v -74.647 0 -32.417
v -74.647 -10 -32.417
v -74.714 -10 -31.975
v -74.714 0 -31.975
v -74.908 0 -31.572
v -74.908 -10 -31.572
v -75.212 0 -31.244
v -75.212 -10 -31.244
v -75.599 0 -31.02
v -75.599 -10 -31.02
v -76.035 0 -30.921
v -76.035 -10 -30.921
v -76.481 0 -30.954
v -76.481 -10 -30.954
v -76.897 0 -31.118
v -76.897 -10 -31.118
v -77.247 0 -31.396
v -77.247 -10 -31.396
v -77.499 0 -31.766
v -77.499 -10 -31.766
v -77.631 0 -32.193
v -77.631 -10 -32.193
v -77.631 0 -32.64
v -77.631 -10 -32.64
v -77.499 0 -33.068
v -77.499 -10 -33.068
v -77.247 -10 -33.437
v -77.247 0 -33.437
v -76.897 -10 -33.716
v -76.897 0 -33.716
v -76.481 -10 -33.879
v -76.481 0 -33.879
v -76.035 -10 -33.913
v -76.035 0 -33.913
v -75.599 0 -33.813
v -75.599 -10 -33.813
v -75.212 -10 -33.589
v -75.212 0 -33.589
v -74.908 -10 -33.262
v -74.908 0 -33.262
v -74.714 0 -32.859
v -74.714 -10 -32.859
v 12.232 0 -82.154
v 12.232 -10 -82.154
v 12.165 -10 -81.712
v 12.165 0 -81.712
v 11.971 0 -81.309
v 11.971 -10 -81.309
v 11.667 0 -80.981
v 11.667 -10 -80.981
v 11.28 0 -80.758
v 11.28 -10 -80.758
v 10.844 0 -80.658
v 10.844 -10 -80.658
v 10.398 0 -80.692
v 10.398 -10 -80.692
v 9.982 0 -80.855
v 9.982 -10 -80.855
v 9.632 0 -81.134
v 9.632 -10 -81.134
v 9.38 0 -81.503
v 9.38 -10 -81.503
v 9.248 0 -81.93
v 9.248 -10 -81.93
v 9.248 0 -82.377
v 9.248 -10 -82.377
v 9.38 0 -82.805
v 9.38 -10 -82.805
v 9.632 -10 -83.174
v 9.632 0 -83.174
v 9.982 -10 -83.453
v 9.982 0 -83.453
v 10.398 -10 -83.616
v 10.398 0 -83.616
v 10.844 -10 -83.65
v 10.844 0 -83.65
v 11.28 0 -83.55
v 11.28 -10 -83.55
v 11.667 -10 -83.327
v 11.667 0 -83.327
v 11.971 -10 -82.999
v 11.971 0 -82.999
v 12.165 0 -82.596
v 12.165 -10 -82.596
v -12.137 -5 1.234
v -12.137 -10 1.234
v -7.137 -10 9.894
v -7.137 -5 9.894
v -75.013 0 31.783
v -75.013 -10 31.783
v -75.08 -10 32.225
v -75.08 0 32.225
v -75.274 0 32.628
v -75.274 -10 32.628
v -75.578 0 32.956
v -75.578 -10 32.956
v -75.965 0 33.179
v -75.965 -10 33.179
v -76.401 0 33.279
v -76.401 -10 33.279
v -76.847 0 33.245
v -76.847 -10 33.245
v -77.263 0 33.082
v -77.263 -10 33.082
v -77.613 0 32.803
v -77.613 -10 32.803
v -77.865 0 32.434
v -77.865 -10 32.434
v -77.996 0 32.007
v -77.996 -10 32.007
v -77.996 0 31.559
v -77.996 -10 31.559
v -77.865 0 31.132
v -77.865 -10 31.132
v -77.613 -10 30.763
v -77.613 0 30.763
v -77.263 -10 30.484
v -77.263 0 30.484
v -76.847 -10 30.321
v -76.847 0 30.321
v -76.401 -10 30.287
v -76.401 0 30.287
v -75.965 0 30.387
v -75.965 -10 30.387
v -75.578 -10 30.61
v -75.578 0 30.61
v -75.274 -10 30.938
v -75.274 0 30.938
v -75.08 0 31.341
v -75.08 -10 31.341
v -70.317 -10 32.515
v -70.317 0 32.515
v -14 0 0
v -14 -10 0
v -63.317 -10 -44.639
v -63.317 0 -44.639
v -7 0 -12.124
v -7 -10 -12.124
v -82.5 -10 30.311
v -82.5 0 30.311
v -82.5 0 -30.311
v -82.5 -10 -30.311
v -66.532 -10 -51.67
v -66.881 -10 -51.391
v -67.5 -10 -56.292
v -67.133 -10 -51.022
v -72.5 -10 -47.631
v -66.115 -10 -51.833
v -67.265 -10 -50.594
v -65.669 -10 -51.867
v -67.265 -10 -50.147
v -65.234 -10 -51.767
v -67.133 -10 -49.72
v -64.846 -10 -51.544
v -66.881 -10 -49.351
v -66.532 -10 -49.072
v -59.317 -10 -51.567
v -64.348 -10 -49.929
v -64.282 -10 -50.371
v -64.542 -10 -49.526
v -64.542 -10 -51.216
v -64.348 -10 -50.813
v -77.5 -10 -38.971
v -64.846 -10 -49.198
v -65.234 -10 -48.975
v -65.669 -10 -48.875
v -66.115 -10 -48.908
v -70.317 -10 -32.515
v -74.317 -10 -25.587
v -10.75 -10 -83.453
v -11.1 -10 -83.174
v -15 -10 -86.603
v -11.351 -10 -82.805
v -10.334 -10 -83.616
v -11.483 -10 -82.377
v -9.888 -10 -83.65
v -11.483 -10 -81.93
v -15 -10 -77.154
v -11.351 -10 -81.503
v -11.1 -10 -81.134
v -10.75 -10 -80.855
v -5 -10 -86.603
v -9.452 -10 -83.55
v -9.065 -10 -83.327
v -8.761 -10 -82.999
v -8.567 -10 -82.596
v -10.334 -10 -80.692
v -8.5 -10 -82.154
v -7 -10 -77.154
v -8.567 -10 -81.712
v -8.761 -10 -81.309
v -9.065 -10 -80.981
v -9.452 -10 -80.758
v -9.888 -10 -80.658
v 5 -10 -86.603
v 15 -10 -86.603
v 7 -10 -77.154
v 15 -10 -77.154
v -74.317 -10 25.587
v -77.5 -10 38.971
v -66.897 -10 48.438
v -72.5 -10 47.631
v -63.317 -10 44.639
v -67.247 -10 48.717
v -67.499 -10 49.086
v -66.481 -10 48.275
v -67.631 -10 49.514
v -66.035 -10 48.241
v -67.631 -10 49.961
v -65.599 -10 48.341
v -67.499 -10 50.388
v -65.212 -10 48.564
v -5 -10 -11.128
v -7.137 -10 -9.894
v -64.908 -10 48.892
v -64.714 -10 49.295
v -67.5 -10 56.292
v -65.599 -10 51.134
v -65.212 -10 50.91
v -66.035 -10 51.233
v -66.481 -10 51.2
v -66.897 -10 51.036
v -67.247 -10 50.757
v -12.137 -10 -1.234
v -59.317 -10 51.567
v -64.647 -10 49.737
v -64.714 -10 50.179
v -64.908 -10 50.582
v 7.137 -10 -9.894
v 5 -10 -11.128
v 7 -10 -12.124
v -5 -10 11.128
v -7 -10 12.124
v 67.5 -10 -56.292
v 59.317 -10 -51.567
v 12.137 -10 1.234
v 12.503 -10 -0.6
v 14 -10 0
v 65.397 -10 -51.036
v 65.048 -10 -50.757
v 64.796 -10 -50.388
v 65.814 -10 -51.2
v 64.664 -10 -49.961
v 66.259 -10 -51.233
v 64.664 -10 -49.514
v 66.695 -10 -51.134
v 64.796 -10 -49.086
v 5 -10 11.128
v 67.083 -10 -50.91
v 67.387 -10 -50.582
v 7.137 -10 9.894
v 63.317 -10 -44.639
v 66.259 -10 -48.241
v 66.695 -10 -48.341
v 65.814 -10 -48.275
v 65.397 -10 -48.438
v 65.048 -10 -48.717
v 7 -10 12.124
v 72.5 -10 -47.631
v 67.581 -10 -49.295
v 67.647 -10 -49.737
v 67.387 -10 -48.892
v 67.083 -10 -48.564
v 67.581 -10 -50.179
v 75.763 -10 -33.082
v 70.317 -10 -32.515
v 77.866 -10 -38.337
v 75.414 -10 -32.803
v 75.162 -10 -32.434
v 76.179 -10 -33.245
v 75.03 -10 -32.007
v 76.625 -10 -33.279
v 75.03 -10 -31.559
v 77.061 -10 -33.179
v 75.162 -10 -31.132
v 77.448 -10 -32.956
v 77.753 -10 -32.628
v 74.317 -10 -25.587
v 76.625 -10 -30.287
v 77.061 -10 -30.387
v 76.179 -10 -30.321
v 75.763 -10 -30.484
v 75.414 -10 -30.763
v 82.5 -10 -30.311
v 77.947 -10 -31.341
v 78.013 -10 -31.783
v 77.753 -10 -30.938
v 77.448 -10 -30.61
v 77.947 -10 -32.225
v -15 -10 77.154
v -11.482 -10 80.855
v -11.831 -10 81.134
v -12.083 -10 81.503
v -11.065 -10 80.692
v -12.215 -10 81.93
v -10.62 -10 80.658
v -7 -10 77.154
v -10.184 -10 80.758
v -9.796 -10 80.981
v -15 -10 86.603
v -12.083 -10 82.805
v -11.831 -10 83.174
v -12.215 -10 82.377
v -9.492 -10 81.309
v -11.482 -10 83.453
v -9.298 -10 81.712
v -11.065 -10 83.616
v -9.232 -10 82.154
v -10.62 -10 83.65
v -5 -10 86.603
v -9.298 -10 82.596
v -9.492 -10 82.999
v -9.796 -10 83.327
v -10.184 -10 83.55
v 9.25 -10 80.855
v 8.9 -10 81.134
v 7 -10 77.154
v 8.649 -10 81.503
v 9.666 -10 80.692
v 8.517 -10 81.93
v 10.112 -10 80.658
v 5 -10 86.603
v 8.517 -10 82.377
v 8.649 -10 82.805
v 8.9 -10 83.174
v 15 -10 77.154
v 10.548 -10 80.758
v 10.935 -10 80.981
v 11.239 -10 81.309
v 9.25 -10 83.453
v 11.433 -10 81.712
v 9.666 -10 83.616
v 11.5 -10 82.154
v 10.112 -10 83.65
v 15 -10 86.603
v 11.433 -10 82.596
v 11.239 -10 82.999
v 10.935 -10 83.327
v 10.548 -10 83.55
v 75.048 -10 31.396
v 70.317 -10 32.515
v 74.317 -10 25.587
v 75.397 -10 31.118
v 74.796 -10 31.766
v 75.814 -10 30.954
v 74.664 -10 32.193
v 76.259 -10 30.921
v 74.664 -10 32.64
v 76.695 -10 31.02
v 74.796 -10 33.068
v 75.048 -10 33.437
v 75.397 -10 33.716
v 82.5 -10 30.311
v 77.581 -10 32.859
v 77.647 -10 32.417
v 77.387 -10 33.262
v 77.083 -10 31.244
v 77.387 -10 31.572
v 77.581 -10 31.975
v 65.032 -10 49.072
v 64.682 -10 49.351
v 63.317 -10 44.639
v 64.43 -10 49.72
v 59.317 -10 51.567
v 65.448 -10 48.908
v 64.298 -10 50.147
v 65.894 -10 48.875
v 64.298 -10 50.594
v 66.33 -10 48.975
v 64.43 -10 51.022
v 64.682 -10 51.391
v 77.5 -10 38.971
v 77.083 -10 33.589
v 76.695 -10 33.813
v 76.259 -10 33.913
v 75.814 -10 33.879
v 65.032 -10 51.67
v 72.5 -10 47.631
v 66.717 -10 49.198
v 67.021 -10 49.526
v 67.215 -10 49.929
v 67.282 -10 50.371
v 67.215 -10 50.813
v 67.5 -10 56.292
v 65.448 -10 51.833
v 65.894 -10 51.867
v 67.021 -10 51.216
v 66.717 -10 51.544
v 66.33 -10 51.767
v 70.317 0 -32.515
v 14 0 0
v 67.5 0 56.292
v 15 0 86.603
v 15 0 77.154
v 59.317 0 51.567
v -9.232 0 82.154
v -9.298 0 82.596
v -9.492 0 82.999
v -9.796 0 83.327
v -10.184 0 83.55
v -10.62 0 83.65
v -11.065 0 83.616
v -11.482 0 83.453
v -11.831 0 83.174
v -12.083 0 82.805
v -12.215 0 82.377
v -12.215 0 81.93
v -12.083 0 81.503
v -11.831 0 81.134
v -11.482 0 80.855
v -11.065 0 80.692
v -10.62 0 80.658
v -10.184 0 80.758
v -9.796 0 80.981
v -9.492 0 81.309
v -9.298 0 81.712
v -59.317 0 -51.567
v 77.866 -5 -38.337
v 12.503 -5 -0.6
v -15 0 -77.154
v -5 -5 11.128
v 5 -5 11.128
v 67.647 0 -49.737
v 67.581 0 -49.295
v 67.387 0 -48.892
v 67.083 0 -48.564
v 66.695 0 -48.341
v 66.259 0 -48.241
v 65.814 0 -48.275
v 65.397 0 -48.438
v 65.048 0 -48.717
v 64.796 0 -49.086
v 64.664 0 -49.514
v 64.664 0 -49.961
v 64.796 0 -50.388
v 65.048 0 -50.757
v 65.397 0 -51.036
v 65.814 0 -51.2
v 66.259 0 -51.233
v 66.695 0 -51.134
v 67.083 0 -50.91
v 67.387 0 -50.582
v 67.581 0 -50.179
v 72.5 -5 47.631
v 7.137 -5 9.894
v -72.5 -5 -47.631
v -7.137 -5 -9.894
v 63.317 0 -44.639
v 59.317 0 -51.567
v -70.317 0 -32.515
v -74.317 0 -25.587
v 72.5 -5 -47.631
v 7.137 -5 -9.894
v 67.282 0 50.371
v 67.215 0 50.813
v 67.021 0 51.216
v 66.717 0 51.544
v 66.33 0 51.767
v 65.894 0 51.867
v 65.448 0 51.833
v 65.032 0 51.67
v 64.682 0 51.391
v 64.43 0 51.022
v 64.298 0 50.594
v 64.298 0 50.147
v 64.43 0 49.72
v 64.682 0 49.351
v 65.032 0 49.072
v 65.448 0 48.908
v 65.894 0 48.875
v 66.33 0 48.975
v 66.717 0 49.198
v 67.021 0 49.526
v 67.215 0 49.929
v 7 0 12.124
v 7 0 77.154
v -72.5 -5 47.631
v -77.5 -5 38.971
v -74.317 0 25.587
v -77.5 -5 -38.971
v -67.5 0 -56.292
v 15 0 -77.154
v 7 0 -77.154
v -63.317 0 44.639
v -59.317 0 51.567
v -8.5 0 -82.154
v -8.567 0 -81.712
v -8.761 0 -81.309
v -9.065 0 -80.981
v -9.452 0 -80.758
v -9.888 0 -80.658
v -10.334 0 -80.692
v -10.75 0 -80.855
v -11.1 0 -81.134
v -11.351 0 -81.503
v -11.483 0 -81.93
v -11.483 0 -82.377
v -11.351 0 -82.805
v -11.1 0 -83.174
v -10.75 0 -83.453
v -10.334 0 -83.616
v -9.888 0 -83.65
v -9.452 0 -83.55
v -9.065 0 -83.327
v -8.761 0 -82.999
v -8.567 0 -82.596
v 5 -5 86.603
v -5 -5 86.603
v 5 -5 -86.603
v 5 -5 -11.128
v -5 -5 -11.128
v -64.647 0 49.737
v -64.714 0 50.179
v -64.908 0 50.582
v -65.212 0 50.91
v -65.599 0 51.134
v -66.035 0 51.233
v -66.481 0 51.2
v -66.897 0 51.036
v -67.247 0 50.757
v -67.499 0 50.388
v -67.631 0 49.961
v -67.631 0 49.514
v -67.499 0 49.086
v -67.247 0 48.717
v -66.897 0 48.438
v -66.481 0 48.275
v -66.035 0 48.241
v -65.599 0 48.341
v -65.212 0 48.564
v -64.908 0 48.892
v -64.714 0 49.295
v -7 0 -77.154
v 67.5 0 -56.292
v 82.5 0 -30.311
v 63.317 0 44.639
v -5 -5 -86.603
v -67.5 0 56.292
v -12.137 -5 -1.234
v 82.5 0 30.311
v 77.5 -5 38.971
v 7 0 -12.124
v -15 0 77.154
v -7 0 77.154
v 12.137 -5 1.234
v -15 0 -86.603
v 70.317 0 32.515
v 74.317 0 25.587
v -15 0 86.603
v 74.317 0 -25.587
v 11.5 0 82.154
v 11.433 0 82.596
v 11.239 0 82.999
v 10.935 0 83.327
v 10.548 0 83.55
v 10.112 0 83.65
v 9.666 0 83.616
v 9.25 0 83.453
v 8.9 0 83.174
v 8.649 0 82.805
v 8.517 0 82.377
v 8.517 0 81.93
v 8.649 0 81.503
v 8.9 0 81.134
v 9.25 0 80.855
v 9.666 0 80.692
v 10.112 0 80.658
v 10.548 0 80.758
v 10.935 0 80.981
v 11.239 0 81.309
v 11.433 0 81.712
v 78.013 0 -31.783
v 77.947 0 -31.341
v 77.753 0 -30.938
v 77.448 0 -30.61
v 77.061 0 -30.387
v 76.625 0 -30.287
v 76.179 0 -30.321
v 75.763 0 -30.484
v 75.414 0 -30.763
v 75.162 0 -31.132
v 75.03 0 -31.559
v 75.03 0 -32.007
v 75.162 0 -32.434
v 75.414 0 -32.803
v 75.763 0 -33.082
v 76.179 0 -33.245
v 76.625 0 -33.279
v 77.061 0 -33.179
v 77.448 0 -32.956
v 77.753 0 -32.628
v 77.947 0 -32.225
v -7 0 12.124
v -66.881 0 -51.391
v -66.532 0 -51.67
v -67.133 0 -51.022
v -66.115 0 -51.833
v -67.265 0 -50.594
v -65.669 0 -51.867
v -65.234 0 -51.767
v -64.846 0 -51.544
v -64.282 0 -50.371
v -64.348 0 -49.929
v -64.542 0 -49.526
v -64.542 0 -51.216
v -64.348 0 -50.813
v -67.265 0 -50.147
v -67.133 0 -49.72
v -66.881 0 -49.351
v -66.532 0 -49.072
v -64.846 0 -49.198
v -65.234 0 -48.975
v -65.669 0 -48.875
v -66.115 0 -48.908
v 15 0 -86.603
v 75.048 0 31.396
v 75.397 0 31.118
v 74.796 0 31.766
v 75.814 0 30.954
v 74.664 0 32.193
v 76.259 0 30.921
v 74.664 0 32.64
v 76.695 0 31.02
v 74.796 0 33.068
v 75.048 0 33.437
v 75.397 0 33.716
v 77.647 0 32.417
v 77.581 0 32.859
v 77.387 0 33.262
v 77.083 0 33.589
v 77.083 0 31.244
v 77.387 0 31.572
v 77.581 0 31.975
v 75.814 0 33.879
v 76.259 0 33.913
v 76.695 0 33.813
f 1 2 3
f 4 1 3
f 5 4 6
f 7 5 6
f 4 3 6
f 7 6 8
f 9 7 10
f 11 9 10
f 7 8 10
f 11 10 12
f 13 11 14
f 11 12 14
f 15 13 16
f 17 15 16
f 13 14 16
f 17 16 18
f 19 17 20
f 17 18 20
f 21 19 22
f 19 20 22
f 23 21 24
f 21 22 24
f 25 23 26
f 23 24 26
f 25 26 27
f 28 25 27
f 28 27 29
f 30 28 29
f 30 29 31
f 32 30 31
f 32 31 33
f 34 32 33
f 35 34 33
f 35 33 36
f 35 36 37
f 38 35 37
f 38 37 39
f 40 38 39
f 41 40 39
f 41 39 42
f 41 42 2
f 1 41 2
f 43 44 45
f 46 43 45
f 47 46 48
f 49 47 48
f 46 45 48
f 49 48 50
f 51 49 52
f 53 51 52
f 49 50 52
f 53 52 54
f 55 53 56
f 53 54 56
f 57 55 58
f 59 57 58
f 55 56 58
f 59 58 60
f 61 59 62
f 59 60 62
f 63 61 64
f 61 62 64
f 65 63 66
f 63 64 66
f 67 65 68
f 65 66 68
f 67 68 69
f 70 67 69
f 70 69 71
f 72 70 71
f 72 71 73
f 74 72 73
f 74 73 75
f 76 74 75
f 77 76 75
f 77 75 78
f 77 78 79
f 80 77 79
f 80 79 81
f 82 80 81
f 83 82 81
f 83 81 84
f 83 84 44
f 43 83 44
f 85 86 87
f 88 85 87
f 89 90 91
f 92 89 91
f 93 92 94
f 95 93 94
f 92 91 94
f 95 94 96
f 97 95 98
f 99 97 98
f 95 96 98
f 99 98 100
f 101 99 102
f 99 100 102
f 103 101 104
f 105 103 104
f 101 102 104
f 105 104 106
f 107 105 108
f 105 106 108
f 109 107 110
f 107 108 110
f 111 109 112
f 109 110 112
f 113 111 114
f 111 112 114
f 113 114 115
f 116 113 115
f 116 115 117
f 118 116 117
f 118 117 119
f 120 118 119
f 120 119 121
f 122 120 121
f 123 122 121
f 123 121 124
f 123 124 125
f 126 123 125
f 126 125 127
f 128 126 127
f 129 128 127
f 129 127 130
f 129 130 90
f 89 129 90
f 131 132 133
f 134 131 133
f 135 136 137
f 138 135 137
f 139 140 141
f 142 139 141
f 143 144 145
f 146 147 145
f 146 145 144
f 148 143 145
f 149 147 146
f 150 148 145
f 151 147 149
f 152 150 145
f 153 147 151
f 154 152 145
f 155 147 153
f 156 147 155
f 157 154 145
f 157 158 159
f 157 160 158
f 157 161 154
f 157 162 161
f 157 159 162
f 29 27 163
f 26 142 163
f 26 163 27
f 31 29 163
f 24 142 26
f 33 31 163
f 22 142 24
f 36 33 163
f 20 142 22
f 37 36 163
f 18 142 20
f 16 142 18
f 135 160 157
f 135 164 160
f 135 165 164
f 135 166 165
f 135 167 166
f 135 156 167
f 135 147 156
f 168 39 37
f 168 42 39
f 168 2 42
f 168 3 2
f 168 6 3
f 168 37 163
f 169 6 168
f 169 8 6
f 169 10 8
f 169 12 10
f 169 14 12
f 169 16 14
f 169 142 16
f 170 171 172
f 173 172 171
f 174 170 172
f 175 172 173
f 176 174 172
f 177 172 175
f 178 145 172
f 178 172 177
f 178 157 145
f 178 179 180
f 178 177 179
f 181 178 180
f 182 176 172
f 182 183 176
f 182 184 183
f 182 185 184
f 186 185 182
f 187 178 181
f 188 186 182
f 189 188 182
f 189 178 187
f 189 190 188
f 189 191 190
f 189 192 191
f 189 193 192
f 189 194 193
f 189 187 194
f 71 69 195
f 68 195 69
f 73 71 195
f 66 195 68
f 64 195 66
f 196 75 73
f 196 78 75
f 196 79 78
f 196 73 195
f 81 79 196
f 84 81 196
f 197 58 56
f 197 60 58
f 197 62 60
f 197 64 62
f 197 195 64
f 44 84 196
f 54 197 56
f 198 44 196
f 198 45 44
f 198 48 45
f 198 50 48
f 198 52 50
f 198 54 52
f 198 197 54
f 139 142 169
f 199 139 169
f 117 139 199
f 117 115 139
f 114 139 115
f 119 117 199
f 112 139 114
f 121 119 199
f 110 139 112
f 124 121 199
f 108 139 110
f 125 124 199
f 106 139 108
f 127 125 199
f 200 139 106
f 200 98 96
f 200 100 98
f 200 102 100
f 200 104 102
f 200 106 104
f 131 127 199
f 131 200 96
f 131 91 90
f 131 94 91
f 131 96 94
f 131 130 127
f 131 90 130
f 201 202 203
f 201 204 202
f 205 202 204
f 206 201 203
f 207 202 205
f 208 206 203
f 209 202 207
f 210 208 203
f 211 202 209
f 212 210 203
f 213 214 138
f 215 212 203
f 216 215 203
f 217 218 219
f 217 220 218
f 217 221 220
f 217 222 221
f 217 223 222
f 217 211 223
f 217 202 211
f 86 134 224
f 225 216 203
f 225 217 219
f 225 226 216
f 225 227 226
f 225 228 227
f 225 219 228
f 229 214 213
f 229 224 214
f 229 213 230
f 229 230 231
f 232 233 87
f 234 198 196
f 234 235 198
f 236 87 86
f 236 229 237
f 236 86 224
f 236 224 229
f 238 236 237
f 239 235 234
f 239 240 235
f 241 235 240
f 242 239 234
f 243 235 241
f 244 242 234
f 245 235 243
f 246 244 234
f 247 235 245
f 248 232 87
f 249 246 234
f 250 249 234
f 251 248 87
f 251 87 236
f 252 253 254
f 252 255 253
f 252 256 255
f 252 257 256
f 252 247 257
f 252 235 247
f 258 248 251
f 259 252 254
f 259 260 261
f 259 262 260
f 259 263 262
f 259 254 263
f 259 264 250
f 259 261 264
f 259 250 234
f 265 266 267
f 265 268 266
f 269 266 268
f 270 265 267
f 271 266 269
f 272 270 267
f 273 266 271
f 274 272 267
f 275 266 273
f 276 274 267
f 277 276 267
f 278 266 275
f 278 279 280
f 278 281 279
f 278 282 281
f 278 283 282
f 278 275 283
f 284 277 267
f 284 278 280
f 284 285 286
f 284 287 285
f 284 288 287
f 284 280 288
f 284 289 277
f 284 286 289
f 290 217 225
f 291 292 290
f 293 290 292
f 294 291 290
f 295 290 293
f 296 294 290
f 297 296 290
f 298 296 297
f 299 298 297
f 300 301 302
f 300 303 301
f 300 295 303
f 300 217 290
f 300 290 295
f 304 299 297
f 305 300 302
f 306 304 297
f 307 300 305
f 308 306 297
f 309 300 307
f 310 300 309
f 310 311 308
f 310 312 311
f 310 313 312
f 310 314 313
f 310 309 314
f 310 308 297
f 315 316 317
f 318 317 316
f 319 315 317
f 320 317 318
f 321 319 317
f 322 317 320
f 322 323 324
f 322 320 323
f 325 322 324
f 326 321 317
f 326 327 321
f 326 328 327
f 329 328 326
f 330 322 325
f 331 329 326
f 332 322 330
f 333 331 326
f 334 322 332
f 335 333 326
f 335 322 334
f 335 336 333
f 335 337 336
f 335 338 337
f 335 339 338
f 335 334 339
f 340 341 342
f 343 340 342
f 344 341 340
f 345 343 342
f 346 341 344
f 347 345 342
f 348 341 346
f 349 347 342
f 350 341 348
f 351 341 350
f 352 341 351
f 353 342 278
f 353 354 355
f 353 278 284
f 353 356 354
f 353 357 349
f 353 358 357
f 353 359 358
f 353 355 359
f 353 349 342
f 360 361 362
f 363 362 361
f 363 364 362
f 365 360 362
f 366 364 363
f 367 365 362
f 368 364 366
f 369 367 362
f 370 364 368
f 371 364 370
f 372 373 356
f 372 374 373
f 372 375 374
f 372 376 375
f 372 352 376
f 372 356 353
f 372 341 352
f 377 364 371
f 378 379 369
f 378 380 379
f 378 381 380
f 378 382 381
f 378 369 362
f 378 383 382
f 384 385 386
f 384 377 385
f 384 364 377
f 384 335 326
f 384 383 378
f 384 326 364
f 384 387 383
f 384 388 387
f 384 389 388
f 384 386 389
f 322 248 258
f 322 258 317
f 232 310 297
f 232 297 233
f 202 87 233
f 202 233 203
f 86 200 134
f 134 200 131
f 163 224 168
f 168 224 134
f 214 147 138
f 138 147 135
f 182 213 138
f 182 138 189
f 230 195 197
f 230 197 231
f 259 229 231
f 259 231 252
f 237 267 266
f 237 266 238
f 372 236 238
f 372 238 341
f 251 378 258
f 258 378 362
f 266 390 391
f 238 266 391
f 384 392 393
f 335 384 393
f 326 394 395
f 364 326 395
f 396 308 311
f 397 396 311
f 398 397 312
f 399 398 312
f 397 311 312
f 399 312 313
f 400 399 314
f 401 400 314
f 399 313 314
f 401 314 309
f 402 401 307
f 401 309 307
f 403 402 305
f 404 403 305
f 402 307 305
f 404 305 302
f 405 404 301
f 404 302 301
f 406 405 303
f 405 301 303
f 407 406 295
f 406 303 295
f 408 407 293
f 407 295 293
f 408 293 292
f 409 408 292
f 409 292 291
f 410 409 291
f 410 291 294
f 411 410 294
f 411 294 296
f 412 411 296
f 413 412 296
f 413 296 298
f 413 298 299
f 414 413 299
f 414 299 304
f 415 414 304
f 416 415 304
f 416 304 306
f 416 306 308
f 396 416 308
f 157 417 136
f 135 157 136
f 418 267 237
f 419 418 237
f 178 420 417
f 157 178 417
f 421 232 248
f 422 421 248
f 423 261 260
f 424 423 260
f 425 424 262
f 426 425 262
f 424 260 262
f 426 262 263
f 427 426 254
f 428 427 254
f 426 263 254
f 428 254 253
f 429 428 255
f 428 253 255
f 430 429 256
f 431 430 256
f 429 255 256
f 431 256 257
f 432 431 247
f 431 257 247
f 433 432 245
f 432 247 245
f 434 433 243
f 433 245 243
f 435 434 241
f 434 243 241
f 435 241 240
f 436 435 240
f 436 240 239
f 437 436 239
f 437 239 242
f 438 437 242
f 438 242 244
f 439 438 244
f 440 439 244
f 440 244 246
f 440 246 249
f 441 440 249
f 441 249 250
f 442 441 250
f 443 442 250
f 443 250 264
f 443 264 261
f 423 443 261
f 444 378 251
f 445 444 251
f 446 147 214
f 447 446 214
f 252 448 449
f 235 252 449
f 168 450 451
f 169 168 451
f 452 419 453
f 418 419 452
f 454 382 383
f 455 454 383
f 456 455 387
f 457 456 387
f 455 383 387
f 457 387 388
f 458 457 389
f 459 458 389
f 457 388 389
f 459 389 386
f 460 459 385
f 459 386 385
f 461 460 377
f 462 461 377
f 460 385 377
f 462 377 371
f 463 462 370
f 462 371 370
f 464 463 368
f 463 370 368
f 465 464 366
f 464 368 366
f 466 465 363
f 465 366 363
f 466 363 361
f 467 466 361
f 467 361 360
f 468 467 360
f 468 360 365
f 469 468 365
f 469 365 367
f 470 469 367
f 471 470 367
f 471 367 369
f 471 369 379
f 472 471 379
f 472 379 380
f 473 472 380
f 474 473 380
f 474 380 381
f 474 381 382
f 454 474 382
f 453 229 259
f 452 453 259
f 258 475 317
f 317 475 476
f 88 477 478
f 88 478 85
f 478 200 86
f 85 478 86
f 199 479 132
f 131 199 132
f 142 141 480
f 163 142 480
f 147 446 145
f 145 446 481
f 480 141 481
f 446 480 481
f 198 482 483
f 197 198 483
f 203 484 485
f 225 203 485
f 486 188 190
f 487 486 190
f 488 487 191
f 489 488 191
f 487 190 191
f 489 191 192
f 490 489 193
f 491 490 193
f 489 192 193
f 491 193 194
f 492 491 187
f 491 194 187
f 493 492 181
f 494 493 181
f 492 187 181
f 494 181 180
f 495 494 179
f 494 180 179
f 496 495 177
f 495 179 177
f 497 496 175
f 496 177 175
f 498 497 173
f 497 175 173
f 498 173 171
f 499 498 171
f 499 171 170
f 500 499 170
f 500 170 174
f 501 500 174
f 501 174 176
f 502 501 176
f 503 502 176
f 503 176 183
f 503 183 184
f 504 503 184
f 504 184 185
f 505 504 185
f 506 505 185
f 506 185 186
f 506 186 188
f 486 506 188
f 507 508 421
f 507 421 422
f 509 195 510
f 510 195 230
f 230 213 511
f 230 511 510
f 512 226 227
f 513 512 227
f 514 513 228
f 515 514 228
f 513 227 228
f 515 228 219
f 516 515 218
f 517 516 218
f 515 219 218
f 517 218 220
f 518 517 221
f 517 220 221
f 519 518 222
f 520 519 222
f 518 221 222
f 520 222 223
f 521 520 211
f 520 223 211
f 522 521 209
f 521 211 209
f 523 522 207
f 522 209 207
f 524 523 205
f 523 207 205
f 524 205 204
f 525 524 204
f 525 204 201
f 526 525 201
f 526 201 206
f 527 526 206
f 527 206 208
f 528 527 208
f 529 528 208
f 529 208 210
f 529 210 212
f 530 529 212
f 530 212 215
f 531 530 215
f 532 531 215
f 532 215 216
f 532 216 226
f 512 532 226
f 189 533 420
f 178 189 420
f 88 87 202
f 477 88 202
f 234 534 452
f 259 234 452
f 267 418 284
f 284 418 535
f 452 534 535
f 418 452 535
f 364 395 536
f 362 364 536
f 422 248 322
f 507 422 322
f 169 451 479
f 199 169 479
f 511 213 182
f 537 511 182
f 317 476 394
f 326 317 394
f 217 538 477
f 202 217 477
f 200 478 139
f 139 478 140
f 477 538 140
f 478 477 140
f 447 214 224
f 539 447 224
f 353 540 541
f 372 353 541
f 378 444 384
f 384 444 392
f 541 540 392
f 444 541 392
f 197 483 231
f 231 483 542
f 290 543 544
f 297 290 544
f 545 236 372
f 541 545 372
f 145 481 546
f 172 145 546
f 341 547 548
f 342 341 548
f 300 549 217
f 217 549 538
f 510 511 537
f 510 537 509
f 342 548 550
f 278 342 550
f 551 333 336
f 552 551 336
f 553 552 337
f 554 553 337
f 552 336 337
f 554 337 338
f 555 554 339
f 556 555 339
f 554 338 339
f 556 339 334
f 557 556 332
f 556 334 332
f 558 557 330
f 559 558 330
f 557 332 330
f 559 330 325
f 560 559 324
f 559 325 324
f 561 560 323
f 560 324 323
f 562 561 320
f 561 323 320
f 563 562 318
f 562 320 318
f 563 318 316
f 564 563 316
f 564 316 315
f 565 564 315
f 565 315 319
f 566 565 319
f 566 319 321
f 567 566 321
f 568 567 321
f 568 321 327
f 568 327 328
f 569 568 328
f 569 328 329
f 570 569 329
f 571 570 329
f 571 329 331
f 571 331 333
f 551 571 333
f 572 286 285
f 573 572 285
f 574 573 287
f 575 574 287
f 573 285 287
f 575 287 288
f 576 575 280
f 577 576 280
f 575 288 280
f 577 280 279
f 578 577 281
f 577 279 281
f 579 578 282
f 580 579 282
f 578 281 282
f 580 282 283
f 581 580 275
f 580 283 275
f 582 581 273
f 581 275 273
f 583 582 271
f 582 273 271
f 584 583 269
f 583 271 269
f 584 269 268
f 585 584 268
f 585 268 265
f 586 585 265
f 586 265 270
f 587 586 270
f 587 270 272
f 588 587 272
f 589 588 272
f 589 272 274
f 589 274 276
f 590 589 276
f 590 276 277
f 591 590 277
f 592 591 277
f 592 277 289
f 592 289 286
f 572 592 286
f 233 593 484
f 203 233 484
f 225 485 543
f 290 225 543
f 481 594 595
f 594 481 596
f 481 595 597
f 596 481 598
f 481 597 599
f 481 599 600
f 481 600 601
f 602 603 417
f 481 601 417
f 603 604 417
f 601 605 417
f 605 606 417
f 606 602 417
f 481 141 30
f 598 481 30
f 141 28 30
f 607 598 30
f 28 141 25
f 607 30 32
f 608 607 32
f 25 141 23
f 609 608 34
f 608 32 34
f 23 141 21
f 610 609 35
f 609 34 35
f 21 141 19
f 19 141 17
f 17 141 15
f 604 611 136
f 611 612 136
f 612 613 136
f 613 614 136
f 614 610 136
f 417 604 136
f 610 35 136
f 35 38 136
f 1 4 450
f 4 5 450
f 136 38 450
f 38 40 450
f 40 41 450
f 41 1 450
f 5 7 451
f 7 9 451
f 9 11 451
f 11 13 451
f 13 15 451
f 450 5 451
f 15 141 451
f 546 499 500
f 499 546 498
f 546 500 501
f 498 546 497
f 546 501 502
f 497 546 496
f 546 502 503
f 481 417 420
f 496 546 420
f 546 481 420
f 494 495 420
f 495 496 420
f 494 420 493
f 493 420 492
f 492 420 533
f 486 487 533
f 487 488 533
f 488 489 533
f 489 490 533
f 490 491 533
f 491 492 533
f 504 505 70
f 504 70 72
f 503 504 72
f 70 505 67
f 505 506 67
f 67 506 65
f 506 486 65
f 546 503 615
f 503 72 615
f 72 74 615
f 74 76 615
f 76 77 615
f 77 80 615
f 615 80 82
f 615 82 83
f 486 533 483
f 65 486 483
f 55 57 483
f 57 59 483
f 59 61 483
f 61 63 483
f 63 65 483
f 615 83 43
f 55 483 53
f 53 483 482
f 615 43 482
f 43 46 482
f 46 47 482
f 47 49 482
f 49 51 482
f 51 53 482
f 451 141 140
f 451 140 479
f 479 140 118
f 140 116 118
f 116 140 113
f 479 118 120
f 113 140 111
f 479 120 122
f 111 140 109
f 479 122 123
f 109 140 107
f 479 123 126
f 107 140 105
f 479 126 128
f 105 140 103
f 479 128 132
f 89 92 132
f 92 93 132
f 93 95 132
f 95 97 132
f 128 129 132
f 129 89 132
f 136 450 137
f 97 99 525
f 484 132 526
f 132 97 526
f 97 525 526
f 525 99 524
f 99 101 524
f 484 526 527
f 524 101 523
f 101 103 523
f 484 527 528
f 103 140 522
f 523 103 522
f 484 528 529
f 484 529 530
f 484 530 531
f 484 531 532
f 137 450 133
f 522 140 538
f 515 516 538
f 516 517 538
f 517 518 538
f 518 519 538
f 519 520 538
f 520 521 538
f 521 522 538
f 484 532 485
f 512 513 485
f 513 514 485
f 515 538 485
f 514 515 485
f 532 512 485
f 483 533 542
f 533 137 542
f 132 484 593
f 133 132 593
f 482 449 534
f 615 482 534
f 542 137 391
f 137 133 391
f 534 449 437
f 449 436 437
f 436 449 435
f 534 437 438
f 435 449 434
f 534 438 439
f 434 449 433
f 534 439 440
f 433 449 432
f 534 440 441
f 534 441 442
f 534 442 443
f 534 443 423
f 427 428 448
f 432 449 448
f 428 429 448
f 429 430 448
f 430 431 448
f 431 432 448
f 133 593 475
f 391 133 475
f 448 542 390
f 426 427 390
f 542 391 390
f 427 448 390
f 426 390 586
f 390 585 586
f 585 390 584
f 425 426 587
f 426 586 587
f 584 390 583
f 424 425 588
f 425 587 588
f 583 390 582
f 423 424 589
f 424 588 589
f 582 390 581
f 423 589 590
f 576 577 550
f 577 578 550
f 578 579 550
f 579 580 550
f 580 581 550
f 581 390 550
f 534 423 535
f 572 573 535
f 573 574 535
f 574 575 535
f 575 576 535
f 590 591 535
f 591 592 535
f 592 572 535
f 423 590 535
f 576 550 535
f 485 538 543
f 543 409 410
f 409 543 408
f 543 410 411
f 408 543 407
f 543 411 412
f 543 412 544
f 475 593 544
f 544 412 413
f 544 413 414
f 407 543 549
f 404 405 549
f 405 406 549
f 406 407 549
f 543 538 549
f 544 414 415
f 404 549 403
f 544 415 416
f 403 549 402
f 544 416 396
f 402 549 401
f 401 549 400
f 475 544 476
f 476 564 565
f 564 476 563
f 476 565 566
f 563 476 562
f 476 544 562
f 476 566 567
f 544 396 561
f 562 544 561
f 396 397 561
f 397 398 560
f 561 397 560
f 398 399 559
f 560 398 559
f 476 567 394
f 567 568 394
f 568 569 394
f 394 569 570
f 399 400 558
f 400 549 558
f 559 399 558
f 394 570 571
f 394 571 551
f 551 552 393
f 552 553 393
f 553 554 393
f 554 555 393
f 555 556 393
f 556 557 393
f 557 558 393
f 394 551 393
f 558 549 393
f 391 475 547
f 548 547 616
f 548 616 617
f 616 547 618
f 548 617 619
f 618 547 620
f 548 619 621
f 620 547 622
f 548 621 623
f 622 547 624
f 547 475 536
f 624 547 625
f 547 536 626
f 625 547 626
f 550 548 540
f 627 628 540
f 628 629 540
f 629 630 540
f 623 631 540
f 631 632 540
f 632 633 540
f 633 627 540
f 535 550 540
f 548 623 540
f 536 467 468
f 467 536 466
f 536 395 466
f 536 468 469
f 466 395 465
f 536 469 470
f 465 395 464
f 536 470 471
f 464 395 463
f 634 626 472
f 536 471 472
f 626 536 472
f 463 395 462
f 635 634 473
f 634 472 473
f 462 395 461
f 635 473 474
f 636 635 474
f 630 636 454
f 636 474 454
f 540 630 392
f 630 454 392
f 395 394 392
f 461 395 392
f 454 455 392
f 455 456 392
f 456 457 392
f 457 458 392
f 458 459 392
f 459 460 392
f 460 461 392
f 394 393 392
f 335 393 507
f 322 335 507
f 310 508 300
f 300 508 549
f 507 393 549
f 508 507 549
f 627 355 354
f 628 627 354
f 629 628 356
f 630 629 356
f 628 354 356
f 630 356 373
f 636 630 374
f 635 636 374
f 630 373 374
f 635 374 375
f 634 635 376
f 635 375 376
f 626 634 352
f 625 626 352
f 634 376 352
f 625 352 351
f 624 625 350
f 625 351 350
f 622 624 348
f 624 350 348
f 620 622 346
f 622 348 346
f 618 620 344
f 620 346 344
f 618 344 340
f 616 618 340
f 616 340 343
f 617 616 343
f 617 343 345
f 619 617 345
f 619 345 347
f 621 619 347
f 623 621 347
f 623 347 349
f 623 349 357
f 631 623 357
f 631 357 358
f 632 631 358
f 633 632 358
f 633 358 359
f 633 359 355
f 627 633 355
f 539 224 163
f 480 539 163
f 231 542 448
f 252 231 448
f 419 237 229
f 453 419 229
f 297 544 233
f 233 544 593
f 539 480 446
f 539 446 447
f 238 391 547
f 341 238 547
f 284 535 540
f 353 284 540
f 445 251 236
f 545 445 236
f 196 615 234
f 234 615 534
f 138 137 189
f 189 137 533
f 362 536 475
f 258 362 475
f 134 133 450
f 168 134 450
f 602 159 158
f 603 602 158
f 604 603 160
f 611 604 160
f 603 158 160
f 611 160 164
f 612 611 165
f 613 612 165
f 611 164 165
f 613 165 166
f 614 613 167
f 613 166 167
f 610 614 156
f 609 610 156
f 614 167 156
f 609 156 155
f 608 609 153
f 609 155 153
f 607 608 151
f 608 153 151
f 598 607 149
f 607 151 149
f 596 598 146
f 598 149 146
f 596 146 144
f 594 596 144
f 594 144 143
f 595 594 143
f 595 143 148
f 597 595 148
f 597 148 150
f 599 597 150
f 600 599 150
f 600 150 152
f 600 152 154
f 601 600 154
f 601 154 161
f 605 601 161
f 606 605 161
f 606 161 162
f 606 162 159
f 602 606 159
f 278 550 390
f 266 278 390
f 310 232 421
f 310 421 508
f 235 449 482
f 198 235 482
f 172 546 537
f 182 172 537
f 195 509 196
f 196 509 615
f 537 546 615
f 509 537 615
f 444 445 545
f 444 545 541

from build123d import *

# Parameters (mm, degrees)
F1_DEPTH = 10
F2_W     = 10
F2_H     = 75.4743308471
F2_H_2   = 22.4482722858
F3_DEPTH = 5
F4_R     = 1.5
F5_DEPTH = 25


with BuildPart() as f1:
    # F0 (on Front) → F1 (new body)
    with BuildSketch(Plane.XZ):
        Polygon((15, 86.6025403784), (-15, 86.6025403784), (-15, 77.153906079), (-7, 77.153906079), (-7, 12.124355653), (-63.3172426656, 44.639130866), (-59.3172426656, 51.5673340962), (-67.5, 56.291651246), (-82.5, 30.3108891325), (-74.3172426656, 25.5865719827), (-70.3172426656, 32.514775213), (-14, 0), (-70.3172426656, -32.514775213), (-74.3172426656, -25.5865719827), (-82.5, -30.3108891325), (-67.5, -56.291651246), (-59.3172426656, -51.5673340962), (-63.3172426656, -44.639130866), (-7, -12.124355653), (-7, -77.153906079), (-15, -77.153906079), (-15, -86.6025403784), (15, -86.6025403784), (15, -77.153906079), (7, -77.153906079), (7, -12.124355653), (63.3172426656, -44.639130866), (59.3172426656, -51.5673340962), (67.5, -56.291651246), (82.5, -30.3108891325), (74.3172426656, -25.5865719827), (70.3172426656, -32.514775213), (14, 0), (70.3172426656, 32.514775213), (74.3172426656, 25.5865719827), (82.5, 30.3108891325), (67.5, 56.291651246), (59.3172426656, 51.5673340962), (63.3172426656, 44.639130866), (7, 12.124355653), (7, 77.153906079), (15, 77.153906079), align=None)
        Polygon((-59.3172426656, -51.5673340962), (-67.5, -56.291651246), (-15, -86.6025403784), (-15, -77.153906079), align=None)
        Polygon((-74.3172426656, 25.5865719827), (-82.5, 30.3108891325), (-82.5, -30.3108891325), (-74.3172426656, -25.5865719827), align=None)
        Polygon((-15, 77.153906079), (-15, 86.6025403784), (-67.5, 56.291651246), (-59.3172426656, 51.5673340962), align=None)
        Polygon((67.5, 56.291651246), (15, 86.6025403784), (15, 77.153906079), (59.3172426656, 51.5673340962), align=None)
        Polygon((82.5, -30.3108891325), (82.5, 30.3108891325), (74.3172426656, 25.5865719827), (74.3172426656, -25.5865719827), align=None)
        Polygon((15, -86.6025403784), (67.5, -56.291651246), (59.3172426656, -51.5673340962), (15, -77.153906079), align=None)
    extrude(amount=F1_DEPTH)

    # F2 (on face) → F3 (cut)
    with BuildSketch(Plane.XZ.offset(10)):
        Polygon((-77.5, 38.9711431703), (-72.5, 47.6313972081), (-109.8431605698, 69.1914810155), (-114.8431605698, 60.5312269776), align=None)
        with Locations((0, 48.8653749549)):
            Rectangle(F2_W, F2_H)
        Polygon((121.6227966993, 75.9924571058), (72.5, 47.6313972081), (77.5, 38.9711431703), (126.6227966993, 67.332203068), align=None)
        Polygon((77.8658404617, -38.3374889031), (72.5, -47.6313972081), (106.878233392, -67.4796795113), (112.2440738537, -58.1857712063), align=None)
        with Locations((0, -97.8266765213)):
            Rectangle(F2_W, F2_H_2)
        Polygon((-72.5, -47.6313972081), (-77.5, -38.9711431703), (-141.8294904827, -76.1117918173), (-136.8294904827, -84.7720458552), align=None)
        with Locations((0, -48.8653749549)):
            Rectangle(F2_W, F2_H)
        Polygon((-7.1373121527, -9.8942317846), (-12.1373121527, -1.2339777467), (-77.5, -38.9711431703), (-72.5, -47.6313972081), align=None)
        Polygon((-12.1373121527, 1.2339777467), (-7.1373121527, 9.8942317846), (-72.5, 47.6313972081), (-77.5, 38.9711431703), align=None)
        Polygon((72.5, 47.6313972081), (7.1373121527, 9.8942317846), (12.1373121527, 1.2339777467), (77.5, 38.9711431703), align=None)
        Polygon((12.5031526145, -0.6003234796), (7.1373121527, -9.8942317846), (72.5, -47.6313972081), (77.8658404617, -38.3374889031), align=None)
    extrude(amount=-F3_DEPTH, mode=Mode.SUBTRACT)

    # F4 (on face) → F5 (cut)
    with BuildSketch(Plane.XZ.offset(10)):
        with Locations((66.1473696845, -49.7372070773)):
            Circle(F4_R)
        with Locations((76.5132101462, -31.7830447345)):
            Circle(F4_R)
        with Locations((76.1473696845, 32.4166990016)):
            Circle(F4_R)
        with Locations((65.7815292228, 50.3708613445)):
            Circle(F4_R)
        with Locations((10, 82.153906079)):
            Circle(F4_R)
        with Locations((-10.7316809234, 82.153906079)):
            Circle(F4_R)
        with Locations((-66.1473696845, 49.7372070773)):
            Circle(F4_R)
        with Locations((-76.5132101462, 31.7830447345)):
            Circle(F4_R)
        with Locations((-76.1473696845, -32.4166990016)):
            Circle(F4_R)
        with Locations((-65.7815292228, -50.3708613445)):
            Circle(F4_R)
        with Locations((-10, -82.153906079)):
            Circle(F4_R)
        with Locations((10.7316809234, -82.153906079)):
            Circle(F4_R)
    extrude(amount=-F5_DEPTH, mode=Mode.SUBTRACT)


solid = f1.part
